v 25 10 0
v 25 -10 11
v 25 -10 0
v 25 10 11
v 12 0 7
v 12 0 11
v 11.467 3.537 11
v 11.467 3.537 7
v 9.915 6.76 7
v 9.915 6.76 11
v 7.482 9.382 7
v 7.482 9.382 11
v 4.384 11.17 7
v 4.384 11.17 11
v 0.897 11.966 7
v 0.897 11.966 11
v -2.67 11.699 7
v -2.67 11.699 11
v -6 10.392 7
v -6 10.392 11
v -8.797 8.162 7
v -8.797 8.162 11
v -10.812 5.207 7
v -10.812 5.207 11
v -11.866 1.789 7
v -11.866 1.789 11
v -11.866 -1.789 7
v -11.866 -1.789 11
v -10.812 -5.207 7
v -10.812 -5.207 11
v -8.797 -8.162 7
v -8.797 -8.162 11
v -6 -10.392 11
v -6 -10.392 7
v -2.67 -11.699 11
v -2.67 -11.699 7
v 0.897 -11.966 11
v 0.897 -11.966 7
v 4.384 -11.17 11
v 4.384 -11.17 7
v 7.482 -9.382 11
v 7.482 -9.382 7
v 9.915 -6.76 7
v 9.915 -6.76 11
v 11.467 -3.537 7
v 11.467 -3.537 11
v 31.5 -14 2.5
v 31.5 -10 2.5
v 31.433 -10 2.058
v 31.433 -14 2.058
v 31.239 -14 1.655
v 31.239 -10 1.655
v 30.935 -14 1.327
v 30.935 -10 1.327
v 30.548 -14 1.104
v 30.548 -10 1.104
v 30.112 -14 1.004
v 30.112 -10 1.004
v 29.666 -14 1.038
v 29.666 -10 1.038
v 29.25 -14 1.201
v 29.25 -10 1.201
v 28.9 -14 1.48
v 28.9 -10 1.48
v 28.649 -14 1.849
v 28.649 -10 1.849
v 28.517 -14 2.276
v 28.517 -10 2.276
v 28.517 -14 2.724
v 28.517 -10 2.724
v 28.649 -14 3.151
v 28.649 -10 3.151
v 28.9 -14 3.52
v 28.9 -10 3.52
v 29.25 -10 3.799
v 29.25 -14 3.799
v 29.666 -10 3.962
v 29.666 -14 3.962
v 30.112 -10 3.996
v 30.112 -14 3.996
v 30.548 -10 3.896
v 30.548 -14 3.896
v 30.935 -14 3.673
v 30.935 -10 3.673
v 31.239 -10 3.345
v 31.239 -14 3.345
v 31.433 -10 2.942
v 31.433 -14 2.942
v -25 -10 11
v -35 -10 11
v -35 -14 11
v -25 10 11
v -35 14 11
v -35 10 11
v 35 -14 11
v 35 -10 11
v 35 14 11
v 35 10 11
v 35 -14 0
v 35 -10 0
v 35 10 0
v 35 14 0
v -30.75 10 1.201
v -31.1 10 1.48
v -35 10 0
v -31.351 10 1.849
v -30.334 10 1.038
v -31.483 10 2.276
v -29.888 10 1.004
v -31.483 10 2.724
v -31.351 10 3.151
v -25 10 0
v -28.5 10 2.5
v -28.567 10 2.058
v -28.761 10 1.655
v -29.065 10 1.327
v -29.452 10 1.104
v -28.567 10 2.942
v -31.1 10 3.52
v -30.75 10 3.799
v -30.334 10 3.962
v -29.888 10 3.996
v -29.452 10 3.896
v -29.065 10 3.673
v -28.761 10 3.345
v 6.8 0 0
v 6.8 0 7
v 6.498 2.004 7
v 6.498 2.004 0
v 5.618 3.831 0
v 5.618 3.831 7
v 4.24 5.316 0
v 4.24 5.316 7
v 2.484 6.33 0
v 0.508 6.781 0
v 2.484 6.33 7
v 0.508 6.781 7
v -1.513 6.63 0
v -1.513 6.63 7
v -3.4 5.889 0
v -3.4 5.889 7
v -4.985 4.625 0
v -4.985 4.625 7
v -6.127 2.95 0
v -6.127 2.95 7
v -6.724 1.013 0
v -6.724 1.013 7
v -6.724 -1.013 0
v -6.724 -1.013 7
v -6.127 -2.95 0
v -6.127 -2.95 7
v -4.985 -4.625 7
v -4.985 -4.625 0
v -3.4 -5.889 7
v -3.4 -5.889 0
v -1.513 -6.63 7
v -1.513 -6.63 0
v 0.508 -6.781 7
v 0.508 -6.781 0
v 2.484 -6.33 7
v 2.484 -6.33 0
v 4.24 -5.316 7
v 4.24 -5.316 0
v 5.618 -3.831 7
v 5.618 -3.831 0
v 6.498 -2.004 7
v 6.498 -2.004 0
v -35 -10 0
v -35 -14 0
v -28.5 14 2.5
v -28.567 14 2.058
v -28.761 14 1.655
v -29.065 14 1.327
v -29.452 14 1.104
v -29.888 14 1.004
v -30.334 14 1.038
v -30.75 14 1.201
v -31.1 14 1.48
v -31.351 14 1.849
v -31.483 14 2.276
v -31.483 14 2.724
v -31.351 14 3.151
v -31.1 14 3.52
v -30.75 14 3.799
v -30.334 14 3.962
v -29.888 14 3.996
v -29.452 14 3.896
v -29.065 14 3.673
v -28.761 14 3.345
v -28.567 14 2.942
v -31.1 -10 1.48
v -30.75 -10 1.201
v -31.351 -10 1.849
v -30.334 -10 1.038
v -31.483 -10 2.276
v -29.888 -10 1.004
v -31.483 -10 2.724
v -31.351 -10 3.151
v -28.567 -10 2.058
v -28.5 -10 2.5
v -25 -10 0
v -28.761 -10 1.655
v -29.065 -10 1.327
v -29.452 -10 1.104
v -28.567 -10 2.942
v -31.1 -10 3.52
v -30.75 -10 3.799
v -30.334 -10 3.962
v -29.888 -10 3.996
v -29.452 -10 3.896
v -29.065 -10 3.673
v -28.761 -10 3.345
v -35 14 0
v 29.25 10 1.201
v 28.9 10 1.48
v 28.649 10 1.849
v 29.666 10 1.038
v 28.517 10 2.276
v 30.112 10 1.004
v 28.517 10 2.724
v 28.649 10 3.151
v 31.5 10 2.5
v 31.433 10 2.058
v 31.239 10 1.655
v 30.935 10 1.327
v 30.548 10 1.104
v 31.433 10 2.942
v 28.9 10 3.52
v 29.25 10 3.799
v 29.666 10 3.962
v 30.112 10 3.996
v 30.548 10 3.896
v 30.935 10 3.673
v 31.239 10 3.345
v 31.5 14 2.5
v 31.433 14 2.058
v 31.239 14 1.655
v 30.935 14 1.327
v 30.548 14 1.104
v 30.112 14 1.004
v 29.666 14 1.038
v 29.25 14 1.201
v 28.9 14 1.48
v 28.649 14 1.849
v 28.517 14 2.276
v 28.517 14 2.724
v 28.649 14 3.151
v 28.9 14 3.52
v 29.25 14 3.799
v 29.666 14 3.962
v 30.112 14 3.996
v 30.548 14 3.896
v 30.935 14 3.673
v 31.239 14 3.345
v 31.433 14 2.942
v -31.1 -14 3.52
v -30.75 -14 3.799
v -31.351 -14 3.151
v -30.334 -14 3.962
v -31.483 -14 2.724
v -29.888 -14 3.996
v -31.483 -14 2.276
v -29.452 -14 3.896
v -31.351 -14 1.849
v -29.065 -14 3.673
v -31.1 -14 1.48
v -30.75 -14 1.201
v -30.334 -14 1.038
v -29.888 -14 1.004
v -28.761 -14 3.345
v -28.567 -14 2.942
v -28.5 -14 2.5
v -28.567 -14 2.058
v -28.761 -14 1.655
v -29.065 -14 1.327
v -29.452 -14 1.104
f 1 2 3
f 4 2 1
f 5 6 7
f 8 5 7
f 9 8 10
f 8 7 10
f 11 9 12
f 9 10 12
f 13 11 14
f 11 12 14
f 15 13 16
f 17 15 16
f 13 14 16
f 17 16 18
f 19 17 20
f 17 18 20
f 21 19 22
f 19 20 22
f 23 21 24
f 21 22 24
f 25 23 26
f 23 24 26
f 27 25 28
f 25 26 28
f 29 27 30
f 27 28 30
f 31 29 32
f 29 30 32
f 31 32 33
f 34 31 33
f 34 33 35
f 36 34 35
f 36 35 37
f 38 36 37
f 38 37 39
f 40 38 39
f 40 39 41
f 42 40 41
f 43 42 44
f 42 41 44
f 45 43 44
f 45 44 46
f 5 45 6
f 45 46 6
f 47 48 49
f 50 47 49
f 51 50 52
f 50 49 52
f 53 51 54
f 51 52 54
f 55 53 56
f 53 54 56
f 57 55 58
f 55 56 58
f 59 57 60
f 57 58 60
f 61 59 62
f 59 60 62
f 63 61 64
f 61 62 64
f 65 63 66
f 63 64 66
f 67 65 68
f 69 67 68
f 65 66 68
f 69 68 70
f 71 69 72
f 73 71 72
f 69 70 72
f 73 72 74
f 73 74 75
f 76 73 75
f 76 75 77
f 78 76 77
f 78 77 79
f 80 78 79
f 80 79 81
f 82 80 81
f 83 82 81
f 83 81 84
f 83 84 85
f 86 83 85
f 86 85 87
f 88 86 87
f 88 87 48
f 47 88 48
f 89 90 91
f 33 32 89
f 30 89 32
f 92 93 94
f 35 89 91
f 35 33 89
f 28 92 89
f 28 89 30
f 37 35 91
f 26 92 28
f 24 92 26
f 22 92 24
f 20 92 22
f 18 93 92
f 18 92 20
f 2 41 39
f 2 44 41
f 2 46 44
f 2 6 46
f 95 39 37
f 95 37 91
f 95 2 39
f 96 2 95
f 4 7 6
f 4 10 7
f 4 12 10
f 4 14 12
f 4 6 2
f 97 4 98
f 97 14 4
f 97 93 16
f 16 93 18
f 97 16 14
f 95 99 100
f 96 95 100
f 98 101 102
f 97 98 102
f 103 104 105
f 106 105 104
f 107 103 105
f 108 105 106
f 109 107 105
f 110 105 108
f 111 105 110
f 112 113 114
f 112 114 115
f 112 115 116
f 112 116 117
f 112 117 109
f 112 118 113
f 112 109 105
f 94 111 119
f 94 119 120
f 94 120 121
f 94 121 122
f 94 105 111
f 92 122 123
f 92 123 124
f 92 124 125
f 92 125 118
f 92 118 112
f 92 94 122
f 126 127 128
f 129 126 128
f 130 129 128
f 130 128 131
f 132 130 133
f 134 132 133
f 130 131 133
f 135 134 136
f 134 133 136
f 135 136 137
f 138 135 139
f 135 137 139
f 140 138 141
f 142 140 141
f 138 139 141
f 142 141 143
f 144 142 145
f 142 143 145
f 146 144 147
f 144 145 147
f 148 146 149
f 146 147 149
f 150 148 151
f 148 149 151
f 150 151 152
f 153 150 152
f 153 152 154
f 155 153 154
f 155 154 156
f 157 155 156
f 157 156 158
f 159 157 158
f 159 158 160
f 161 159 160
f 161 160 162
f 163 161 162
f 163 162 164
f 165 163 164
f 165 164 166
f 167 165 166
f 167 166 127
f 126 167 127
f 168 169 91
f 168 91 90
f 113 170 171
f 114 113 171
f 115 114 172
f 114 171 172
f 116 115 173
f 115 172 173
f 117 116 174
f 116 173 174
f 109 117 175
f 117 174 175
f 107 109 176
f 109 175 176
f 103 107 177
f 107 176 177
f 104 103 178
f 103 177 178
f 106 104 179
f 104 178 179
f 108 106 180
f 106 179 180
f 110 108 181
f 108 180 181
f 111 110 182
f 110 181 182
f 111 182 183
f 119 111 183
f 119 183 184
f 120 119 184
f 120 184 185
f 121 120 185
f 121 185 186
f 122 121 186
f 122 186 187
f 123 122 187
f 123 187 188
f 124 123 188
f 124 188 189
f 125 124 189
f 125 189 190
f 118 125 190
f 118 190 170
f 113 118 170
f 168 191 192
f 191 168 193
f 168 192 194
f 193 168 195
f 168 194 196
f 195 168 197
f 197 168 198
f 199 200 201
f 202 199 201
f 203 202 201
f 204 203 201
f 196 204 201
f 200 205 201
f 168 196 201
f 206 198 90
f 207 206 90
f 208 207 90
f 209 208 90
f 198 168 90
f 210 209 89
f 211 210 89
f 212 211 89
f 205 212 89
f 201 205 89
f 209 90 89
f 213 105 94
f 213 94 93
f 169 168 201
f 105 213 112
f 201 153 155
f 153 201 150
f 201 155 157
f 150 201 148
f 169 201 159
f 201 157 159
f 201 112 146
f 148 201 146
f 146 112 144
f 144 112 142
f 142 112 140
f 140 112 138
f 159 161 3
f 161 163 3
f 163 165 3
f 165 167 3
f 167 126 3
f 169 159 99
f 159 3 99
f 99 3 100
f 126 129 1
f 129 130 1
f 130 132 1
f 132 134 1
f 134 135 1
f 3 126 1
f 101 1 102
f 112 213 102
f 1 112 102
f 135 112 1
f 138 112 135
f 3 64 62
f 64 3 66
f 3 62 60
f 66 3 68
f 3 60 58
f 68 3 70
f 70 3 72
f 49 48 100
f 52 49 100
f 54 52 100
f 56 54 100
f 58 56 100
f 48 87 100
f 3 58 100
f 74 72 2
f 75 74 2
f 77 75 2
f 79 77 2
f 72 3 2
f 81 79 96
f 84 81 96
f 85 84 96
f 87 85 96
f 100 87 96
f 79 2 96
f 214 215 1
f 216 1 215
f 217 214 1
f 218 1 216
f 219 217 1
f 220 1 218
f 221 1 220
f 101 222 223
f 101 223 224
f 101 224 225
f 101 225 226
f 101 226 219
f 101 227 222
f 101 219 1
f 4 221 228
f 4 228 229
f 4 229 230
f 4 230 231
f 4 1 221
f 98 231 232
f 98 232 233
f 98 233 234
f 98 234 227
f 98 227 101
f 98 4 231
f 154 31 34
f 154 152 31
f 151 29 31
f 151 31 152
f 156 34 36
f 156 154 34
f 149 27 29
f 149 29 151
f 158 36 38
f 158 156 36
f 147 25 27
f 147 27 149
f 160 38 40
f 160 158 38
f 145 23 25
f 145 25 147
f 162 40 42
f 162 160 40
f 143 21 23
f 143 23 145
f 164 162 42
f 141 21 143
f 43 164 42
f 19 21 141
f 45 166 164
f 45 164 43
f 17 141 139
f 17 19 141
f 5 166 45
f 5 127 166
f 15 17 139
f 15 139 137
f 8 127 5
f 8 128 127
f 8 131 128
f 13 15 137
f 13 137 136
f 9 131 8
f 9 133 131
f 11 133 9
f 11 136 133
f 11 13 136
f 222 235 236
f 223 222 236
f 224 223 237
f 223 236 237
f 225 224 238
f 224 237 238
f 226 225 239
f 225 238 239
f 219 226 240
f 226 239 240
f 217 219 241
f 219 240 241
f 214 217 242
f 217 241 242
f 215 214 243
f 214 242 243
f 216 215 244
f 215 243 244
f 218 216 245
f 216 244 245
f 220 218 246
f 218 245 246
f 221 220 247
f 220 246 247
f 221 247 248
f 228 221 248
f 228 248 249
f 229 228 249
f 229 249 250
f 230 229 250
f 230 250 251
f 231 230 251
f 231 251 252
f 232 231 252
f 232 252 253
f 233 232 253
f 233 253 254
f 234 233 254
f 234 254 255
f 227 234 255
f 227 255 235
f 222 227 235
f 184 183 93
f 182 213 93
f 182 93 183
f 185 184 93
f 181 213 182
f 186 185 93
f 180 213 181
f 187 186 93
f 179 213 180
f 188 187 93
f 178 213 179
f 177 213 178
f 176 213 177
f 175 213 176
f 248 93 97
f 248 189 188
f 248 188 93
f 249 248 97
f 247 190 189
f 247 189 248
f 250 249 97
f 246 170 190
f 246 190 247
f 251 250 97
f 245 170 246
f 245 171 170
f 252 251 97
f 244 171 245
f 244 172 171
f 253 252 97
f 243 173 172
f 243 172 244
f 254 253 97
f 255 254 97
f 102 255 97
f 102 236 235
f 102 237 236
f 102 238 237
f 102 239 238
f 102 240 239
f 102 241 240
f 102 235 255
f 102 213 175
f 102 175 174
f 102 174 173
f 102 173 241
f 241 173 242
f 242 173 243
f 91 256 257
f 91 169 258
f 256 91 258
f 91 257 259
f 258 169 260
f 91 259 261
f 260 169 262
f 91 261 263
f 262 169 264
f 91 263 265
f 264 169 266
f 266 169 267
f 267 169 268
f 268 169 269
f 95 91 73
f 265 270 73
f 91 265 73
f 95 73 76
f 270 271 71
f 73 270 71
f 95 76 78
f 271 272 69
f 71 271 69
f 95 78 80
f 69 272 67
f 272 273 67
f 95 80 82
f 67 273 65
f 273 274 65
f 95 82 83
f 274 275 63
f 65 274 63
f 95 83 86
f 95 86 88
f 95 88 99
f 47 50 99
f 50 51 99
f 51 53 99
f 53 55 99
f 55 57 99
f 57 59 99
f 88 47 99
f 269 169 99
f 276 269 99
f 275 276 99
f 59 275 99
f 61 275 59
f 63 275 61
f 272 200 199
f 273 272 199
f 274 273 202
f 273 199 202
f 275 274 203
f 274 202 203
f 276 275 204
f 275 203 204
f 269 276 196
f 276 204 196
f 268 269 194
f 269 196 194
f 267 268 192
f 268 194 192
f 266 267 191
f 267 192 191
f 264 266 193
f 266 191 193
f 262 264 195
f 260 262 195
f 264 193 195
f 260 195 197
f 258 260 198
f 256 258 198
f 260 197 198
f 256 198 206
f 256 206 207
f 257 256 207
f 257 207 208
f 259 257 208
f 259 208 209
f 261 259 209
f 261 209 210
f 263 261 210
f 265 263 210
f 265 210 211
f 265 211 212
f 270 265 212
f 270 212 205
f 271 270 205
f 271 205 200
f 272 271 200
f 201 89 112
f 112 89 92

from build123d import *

# Parameters (mm, degrees)
ESQUISSE1_W             = 70
ESQUISSE1_H             = 28
BOSS_EXTRU_1_DEPTH      = 11
ESQUISSE2_R             = 1.5
ENL_V_MAT_EXTRU_1_DEPTH = 29
ESQUISSE3_R             = 6.8
ENL_V_MAT_EXTRU_2_DEPTH = 12
ESQUISSE4_R             = 12
ENL_V_MAT_EXTRU_3_DEPTH = 4
ESQUISSE5_W             = 10
ESQUISSE5_H             = 20
ENL_V_MAT_EXTRU_4_DEPTH = 12
ESQUISSE6_W             = 10
ESQUISSE6_H             = 20
ENL_V_MAT_EXTRU_5_DEPTH = 12


with BuildPart() as part:
    # Esquisse1 → Boss.-Extru.1 (new body)
    with BuildSketch(Plane.XY):
        Rectangle(ESQUISSE1_W, ESQUISSE1_H)
    extrude(amount=BOSS_EXTRU_1_DEPTH)

    # Esquisse2 → Enlèv. mat.-Extru.1 (cut, through all)
    with BuildSketch(Plane(origin=(0, 14, 0), x_dir=(1, 0, 0), z_dir=(0, 1, 0))):
        with Locations((30, -2.5)):
            Circle(ESQUISSE2_R)
        with Locations((-30, -2.5)):
            Circle(ESQUISSE2_R)
    extrude(amount=-ENL_V_MAT_EXTRU_1_DEPTH, mode=Mode.SUBTRACT)

    # Esquisse3 → Enlèv. mat.-Extru.2 (cut, through all)
    with BuildSketch(Plane.XY.offset(11)):
        Circle(ESQUISSE3_R)
    extrude(amount=-ENL_V_MAT_EXTRU_2_DEPTH, mode=Mode.SUBTRACT)

    # Esquisse4 → Enlèv. mat.-Extru.3 (cut)
    with BuildSketch(Plane.XY.offset(11)):
        Circle(ESQUISSE4_R)
    extrude(amount=-ENL_V_MAT_EXTRU_3_DEPTH, mode=Mode.SUBTRACT)

    # Esquisse5 → Enlèv. mat.-Extru.4 (cut, through all)
    with BuildSketch(Plane.XY.offset(11)):
        with Locations((-30, 0)):
            Rectangle(ESQUISSE5_W, ESQUISSE5_H)
    extrude(amount=-ENL_V_MAT_EXTRU_4_DEPTH, mode=Mode.SUBTRACT)

    # Esquisse6 → Enlèv. mat.-Extru.5 (cut, through all)
    with BuildSketch(Plane.XY.offset(11)):
        with Locations((30, 0)):
            Rectangle(ESQUISSE6_W, ESQUISSE6_H)
    extrude(amount=-ENL_V_MAT_EXTRU_5_DEPTH, mode=Mode.SUBTRACT)


solid = part.part
